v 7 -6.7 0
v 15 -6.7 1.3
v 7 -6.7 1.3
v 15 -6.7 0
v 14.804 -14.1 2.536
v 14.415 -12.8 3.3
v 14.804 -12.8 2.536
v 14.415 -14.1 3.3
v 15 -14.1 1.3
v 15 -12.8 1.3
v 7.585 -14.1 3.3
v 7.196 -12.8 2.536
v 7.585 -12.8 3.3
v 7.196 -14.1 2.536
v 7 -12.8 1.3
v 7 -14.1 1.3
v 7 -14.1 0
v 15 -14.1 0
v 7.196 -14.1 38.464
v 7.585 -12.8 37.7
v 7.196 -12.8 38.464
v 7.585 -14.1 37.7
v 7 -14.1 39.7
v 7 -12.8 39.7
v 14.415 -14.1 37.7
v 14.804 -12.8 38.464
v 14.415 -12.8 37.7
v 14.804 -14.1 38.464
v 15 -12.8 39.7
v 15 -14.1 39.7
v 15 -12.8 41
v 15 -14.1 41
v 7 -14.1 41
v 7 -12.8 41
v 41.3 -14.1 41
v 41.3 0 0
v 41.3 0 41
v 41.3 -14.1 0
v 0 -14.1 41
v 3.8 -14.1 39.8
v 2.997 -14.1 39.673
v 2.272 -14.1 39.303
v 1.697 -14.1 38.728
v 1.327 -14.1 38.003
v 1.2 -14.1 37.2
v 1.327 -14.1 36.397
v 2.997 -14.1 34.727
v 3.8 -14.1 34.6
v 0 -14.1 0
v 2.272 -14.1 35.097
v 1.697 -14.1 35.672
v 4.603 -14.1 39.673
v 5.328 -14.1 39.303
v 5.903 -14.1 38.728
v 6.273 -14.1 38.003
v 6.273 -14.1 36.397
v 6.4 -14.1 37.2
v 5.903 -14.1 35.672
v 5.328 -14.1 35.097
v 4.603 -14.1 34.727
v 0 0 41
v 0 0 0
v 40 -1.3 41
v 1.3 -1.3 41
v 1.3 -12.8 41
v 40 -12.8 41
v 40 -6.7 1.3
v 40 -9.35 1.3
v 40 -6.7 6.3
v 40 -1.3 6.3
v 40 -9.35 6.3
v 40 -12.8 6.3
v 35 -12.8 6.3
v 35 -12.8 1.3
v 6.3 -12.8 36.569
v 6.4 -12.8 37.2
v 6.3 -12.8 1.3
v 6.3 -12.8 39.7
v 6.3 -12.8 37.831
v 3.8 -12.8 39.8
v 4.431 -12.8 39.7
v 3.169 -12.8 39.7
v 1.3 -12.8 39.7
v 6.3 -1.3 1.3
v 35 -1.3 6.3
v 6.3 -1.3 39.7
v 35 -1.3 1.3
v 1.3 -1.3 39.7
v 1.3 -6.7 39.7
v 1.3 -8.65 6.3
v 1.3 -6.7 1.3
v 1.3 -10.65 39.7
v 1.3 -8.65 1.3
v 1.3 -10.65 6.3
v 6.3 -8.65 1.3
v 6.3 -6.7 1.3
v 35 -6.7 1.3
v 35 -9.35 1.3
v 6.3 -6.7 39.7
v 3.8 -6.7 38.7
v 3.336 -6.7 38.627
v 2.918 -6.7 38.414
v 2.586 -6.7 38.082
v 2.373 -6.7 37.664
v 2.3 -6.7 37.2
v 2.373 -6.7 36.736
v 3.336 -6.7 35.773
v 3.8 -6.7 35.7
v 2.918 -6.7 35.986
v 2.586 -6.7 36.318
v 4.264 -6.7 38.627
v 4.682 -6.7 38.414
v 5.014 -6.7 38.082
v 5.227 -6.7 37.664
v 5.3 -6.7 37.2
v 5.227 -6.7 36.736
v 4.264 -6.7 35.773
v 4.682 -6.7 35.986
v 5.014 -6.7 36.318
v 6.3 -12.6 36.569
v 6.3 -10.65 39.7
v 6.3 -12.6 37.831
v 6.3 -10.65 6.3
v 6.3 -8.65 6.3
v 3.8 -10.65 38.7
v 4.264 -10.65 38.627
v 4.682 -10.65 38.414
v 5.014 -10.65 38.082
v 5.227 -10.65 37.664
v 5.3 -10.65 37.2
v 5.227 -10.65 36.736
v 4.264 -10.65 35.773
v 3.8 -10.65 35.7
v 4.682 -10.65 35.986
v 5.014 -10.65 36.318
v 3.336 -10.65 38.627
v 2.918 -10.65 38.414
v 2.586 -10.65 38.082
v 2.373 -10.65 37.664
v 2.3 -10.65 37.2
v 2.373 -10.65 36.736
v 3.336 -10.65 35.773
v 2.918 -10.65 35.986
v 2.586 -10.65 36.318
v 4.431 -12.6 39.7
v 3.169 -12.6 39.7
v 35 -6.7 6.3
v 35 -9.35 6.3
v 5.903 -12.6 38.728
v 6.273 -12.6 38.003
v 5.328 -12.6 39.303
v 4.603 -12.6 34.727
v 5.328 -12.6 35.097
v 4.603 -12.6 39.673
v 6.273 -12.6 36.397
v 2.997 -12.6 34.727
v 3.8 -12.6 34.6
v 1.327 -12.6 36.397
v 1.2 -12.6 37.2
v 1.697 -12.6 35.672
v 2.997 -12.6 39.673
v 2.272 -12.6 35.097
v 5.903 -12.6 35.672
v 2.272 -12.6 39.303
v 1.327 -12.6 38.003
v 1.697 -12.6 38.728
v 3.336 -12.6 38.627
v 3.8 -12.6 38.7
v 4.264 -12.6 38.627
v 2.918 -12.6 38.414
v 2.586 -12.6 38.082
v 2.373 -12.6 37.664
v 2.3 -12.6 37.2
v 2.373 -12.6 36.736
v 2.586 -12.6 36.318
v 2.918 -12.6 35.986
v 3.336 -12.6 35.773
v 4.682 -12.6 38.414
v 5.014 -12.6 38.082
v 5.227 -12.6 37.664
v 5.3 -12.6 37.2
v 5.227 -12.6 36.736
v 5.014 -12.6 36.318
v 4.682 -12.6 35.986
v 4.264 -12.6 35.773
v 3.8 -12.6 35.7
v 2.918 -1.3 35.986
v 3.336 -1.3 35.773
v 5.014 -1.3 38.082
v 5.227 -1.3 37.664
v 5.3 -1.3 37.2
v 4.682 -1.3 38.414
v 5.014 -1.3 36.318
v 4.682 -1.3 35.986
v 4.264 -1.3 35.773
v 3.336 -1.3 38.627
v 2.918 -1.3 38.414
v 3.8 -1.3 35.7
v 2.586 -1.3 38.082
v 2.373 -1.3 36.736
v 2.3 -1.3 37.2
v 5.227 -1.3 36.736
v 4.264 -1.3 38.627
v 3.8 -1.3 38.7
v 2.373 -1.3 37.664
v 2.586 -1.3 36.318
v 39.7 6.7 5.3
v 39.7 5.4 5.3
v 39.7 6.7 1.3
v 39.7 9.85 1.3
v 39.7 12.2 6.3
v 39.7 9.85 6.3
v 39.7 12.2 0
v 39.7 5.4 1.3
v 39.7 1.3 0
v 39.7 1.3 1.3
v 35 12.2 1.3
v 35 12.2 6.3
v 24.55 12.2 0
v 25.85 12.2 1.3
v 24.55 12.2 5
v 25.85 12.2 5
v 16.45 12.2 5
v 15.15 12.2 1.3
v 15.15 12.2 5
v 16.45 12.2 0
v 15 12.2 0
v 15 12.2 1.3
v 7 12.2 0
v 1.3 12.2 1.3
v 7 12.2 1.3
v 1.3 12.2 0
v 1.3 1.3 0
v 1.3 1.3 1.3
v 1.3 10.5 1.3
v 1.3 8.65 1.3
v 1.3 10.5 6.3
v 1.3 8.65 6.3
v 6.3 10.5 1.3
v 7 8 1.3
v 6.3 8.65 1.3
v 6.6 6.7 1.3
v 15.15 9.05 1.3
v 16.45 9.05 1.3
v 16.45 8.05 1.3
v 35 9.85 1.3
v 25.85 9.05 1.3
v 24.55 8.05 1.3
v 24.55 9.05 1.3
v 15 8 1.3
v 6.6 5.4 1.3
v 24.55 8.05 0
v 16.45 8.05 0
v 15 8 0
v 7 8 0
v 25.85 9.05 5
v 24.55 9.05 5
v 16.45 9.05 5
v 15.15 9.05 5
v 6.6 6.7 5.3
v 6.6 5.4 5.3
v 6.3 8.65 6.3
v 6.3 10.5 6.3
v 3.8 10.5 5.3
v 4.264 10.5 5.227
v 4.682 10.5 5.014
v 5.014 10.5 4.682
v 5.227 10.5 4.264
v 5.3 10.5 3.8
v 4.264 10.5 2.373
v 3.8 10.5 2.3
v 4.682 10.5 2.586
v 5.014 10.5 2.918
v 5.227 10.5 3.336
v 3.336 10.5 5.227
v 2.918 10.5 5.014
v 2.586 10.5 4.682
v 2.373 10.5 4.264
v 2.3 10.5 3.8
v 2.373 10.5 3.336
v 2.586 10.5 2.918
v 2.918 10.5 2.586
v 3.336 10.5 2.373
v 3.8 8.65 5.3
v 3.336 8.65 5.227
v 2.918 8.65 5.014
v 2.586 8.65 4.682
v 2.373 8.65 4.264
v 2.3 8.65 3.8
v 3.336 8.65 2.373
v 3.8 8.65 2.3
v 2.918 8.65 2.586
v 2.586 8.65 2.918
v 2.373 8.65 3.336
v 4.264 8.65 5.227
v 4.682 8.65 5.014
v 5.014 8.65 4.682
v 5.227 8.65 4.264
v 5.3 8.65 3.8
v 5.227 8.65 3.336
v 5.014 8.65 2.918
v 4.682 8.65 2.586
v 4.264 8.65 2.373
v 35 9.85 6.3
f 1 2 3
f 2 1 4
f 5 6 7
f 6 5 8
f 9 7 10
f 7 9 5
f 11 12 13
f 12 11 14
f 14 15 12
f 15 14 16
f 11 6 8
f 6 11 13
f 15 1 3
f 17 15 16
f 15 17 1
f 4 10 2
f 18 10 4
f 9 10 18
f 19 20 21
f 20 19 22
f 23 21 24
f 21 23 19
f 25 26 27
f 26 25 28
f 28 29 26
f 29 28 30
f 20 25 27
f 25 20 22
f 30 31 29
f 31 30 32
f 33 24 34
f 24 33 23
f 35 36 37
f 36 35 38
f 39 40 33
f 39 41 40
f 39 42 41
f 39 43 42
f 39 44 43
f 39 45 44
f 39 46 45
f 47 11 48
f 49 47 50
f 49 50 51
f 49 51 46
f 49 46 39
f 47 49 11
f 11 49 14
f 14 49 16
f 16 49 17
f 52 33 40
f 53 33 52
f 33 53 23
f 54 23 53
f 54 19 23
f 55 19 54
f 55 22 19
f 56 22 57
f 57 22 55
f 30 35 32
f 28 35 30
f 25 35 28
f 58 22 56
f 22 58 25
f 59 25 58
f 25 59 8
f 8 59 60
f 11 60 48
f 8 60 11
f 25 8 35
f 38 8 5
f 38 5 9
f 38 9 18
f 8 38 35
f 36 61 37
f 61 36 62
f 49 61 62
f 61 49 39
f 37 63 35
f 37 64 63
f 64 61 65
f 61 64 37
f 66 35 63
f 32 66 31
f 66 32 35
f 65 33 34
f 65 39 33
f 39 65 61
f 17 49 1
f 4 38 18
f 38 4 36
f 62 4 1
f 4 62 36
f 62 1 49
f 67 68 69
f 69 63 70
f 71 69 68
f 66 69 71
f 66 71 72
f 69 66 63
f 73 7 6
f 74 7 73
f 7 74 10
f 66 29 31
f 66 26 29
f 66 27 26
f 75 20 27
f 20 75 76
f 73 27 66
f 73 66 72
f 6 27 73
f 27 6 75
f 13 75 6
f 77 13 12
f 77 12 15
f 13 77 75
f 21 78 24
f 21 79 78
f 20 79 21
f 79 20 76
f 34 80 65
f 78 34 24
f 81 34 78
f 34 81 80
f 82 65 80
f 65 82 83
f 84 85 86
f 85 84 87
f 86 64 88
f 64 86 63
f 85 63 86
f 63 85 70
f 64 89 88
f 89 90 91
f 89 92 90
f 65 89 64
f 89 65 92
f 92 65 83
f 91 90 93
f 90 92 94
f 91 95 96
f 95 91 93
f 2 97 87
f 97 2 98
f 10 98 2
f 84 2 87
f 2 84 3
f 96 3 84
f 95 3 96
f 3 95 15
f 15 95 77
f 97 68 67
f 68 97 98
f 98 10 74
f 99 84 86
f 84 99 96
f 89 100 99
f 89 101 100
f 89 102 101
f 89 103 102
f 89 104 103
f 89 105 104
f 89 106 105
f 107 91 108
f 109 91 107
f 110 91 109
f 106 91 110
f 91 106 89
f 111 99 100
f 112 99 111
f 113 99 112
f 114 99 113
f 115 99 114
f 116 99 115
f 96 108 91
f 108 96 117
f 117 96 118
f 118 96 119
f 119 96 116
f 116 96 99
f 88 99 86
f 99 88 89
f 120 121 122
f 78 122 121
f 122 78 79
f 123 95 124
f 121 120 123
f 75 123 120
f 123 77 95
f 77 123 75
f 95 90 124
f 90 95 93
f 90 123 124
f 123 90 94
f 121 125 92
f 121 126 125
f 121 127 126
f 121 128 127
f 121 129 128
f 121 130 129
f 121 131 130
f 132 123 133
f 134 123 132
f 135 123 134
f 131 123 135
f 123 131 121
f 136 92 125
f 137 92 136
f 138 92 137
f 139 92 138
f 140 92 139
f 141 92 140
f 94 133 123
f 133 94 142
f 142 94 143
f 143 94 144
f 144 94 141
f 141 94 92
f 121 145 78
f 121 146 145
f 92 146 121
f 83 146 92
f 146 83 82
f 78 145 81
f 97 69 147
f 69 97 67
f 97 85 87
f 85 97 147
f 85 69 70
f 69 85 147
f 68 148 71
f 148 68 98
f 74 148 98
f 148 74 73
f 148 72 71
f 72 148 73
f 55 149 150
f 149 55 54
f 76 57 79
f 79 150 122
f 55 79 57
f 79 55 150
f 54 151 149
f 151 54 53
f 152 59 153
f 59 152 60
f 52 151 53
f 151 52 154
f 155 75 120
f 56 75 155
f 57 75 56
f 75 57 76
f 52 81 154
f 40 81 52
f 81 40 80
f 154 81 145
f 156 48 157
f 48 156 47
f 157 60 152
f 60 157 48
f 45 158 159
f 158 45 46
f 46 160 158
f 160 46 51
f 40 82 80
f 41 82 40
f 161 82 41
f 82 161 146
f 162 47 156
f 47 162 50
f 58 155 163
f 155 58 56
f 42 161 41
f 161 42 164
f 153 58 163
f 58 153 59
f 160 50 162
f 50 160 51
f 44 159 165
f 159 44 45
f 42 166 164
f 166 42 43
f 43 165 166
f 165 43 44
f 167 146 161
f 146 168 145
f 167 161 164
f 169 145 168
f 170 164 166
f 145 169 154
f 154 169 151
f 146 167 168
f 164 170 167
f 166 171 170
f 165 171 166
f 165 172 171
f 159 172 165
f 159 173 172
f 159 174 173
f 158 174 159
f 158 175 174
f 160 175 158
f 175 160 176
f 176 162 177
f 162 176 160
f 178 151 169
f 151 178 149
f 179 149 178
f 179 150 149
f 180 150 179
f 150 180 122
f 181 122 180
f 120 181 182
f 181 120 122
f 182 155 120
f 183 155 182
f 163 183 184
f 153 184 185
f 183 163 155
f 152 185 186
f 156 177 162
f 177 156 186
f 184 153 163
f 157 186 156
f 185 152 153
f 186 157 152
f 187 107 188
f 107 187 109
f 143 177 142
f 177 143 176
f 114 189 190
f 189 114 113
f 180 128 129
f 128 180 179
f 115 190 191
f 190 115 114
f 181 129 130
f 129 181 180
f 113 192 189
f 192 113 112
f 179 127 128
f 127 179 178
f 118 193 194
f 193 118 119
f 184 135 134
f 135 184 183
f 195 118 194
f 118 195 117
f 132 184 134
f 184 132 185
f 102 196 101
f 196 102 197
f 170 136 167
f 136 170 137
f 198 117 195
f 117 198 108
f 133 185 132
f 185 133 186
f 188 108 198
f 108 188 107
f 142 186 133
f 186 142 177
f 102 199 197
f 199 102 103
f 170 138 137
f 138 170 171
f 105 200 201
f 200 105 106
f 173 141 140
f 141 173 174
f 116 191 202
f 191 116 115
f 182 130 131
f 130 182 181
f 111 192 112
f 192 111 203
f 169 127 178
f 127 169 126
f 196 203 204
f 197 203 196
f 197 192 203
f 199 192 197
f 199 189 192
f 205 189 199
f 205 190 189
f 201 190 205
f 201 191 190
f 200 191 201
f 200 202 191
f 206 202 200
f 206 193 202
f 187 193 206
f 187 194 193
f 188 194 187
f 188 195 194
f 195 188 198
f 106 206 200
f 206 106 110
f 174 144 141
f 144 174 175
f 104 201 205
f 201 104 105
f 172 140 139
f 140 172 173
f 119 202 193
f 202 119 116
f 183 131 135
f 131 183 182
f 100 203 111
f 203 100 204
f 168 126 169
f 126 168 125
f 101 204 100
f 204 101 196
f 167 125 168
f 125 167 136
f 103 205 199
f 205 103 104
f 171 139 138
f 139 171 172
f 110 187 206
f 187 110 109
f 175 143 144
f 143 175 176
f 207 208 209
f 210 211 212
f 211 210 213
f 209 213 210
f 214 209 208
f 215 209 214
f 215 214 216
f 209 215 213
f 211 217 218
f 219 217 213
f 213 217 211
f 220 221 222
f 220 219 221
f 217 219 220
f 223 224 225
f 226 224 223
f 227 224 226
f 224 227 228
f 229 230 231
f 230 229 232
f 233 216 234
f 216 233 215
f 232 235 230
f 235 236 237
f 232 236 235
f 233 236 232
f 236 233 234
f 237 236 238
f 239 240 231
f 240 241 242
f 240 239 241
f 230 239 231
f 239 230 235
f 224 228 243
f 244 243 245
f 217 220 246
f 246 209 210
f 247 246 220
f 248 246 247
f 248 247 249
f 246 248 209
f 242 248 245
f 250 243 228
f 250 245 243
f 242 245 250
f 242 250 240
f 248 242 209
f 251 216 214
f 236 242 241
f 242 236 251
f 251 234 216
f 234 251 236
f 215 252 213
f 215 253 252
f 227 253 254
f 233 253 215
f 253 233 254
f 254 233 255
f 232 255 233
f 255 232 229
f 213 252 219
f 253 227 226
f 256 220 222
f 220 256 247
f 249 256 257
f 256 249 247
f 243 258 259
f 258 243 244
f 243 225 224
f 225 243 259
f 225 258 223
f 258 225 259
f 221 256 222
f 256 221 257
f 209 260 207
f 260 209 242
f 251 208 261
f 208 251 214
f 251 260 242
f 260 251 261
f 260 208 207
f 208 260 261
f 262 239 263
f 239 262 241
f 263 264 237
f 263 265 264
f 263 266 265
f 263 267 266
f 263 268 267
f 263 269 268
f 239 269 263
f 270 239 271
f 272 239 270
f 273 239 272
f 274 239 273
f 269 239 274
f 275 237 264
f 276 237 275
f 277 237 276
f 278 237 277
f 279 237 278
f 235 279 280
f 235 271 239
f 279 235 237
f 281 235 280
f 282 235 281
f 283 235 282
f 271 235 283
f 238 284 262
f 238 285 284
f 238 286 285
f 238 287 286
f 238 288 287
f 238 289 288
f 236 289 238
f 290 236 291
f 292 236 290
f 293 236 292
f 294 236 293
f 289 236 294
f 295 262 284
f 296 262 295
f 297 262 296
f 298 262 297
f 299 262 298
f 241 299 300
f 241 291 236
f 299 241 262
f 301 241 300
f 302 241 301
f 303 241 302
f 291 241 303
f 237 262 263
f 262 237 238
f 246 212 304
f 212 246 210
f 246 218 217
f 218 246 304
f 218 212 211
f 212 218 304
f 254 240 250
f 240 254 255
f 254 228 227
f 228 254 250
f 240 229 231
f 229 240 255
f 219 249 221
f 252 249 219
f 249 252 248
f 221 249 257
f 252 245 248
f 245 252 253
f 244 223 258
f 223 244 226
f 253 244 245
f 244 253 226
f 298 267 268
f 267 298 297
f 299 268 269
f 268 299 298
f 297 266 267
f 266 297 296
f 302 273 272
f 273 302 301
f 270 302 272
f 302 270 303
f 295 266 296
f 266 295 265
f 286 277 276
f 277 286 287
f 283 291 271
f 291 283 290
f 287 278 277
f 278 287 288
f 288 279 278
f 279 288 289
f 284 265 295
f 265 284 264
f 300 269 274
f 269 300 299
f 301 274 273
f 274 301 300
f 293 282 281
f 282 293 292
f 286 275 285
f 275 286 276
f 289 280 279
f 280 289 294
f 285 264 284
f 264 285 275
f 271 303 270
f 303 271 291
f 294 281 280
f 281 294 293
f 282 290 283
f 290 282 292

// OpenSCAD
function mm(i) = i*25.4;

extra = 0.3;
wall = 1.3;
width = mm(1.5)+extra*2;
length = mm(1.5)+extra;
thickness = 11.5;
jst_t = 5.4;
pcb_t = 1.65;
bt_t = 1.0;
usb_w = 7.8+extra;

module cutout(w) {
    union() {
        intersection() {
            cylinder(r=w/2, h=20, $fn=20);
            translate([-w/2, -w/4, 0]) cube([w, w/2, 20]);
        }
        translate([-w/2, 0, 0]) cube([w, w, 20]);
    }
}       

module body() {
    difference() {
        union() {
            difference() {
                cube([width+wall*2, length+wall*2, thickness+wall*2]);
                translate([wall, wall, wall]) cube([width, length+wall*2, thickness]);
                // button cutouts
                translate([wall+9.7, wall, wall+jst_t]) rotate([0, 0, 180]) cutout(8);
                translate([wall+9.7, wall+length, wall+jst_t]) cutout(8);
            }
            // pcb holder on the button/hole side
            translate([wall, wall, wall]) cube([5.0, length, jst_t]);
            translate([wall, wall, wall+jst_t+pcb_t+extra]) cube([5, 5, thickness-jst_t-pcb_t-extra]);
            translate([wall, wall, wall+jst_t+pcb_t+extra+2]) cube([5, length, thickness-jst_t-pcb_t-extra-2]);
            // pcb holder on the bluetooth side
            translate([wall+width-5.0, wall, wall]) cube([5, 5, jst_t]);
            translate([wall+width-5.0, wall, wall+jst_t+pcb_t+bt_t]) cube([5, 5, thickness-jst_t-pcb_t-bt_t]);
        }
        translate([wall+2.5, wall+length-2.5, wall+thickness-0.2]) cylinder(r=2.6, h=5, $fn=20);
        translate([wall+2.5, wall+length-2.5, wall]) cylinder(r=1.5, h=20, $fn=20);
    }
}

module lid() {
    difference() {
        union () {
            cube([width-extra, wall, thickness-extra*2]);
            // holder around usb hole
            translate([(width-extra)/2-usb_w/2-wall, 0, jst_t+pcb_t-extra+1]) cube([usb_w+wall*2, 5, thickness-extra*2-(jst_t+pcb_t-extra)-1]);
            // below pcb
            translate([5.0+extra, wall, jst_t-wall]) cube([width-extra*2-5.0, 4.0, wall]);
            // screw hole piece
            translate([0, wall, jst_t+pcb_t+extra]) cube([5, 5, thickness-jst_t-pcb_t-2-extra*2]);
            // power supply side piece
            translate([width-5.0, wall, jst_t+pcb_t+1.5]) cube([5.0-extra, 5.0, thickness-jst_t-pcb_t-1.5-extra*2]);
        }
        // usb hole
        translate([(width-extra)/2-usb_w/2, 0, jst_t+pcb_t-extra]) cube([usb_w, 10, 10]);
        // button cutout
        translate([9.7, 0, wall+jst_t]) cutout(8);
        // screw hole
        translate([2.5, wall+2.5, 0]) cylinder(r=1.5, h=20, $fn=20);
    }
}
    

rotate([90, 0, 0]) body();
translate([wall, wall, 0]) mirror([0, 1, 0]) rotate([90, 0, 0]) lid();
